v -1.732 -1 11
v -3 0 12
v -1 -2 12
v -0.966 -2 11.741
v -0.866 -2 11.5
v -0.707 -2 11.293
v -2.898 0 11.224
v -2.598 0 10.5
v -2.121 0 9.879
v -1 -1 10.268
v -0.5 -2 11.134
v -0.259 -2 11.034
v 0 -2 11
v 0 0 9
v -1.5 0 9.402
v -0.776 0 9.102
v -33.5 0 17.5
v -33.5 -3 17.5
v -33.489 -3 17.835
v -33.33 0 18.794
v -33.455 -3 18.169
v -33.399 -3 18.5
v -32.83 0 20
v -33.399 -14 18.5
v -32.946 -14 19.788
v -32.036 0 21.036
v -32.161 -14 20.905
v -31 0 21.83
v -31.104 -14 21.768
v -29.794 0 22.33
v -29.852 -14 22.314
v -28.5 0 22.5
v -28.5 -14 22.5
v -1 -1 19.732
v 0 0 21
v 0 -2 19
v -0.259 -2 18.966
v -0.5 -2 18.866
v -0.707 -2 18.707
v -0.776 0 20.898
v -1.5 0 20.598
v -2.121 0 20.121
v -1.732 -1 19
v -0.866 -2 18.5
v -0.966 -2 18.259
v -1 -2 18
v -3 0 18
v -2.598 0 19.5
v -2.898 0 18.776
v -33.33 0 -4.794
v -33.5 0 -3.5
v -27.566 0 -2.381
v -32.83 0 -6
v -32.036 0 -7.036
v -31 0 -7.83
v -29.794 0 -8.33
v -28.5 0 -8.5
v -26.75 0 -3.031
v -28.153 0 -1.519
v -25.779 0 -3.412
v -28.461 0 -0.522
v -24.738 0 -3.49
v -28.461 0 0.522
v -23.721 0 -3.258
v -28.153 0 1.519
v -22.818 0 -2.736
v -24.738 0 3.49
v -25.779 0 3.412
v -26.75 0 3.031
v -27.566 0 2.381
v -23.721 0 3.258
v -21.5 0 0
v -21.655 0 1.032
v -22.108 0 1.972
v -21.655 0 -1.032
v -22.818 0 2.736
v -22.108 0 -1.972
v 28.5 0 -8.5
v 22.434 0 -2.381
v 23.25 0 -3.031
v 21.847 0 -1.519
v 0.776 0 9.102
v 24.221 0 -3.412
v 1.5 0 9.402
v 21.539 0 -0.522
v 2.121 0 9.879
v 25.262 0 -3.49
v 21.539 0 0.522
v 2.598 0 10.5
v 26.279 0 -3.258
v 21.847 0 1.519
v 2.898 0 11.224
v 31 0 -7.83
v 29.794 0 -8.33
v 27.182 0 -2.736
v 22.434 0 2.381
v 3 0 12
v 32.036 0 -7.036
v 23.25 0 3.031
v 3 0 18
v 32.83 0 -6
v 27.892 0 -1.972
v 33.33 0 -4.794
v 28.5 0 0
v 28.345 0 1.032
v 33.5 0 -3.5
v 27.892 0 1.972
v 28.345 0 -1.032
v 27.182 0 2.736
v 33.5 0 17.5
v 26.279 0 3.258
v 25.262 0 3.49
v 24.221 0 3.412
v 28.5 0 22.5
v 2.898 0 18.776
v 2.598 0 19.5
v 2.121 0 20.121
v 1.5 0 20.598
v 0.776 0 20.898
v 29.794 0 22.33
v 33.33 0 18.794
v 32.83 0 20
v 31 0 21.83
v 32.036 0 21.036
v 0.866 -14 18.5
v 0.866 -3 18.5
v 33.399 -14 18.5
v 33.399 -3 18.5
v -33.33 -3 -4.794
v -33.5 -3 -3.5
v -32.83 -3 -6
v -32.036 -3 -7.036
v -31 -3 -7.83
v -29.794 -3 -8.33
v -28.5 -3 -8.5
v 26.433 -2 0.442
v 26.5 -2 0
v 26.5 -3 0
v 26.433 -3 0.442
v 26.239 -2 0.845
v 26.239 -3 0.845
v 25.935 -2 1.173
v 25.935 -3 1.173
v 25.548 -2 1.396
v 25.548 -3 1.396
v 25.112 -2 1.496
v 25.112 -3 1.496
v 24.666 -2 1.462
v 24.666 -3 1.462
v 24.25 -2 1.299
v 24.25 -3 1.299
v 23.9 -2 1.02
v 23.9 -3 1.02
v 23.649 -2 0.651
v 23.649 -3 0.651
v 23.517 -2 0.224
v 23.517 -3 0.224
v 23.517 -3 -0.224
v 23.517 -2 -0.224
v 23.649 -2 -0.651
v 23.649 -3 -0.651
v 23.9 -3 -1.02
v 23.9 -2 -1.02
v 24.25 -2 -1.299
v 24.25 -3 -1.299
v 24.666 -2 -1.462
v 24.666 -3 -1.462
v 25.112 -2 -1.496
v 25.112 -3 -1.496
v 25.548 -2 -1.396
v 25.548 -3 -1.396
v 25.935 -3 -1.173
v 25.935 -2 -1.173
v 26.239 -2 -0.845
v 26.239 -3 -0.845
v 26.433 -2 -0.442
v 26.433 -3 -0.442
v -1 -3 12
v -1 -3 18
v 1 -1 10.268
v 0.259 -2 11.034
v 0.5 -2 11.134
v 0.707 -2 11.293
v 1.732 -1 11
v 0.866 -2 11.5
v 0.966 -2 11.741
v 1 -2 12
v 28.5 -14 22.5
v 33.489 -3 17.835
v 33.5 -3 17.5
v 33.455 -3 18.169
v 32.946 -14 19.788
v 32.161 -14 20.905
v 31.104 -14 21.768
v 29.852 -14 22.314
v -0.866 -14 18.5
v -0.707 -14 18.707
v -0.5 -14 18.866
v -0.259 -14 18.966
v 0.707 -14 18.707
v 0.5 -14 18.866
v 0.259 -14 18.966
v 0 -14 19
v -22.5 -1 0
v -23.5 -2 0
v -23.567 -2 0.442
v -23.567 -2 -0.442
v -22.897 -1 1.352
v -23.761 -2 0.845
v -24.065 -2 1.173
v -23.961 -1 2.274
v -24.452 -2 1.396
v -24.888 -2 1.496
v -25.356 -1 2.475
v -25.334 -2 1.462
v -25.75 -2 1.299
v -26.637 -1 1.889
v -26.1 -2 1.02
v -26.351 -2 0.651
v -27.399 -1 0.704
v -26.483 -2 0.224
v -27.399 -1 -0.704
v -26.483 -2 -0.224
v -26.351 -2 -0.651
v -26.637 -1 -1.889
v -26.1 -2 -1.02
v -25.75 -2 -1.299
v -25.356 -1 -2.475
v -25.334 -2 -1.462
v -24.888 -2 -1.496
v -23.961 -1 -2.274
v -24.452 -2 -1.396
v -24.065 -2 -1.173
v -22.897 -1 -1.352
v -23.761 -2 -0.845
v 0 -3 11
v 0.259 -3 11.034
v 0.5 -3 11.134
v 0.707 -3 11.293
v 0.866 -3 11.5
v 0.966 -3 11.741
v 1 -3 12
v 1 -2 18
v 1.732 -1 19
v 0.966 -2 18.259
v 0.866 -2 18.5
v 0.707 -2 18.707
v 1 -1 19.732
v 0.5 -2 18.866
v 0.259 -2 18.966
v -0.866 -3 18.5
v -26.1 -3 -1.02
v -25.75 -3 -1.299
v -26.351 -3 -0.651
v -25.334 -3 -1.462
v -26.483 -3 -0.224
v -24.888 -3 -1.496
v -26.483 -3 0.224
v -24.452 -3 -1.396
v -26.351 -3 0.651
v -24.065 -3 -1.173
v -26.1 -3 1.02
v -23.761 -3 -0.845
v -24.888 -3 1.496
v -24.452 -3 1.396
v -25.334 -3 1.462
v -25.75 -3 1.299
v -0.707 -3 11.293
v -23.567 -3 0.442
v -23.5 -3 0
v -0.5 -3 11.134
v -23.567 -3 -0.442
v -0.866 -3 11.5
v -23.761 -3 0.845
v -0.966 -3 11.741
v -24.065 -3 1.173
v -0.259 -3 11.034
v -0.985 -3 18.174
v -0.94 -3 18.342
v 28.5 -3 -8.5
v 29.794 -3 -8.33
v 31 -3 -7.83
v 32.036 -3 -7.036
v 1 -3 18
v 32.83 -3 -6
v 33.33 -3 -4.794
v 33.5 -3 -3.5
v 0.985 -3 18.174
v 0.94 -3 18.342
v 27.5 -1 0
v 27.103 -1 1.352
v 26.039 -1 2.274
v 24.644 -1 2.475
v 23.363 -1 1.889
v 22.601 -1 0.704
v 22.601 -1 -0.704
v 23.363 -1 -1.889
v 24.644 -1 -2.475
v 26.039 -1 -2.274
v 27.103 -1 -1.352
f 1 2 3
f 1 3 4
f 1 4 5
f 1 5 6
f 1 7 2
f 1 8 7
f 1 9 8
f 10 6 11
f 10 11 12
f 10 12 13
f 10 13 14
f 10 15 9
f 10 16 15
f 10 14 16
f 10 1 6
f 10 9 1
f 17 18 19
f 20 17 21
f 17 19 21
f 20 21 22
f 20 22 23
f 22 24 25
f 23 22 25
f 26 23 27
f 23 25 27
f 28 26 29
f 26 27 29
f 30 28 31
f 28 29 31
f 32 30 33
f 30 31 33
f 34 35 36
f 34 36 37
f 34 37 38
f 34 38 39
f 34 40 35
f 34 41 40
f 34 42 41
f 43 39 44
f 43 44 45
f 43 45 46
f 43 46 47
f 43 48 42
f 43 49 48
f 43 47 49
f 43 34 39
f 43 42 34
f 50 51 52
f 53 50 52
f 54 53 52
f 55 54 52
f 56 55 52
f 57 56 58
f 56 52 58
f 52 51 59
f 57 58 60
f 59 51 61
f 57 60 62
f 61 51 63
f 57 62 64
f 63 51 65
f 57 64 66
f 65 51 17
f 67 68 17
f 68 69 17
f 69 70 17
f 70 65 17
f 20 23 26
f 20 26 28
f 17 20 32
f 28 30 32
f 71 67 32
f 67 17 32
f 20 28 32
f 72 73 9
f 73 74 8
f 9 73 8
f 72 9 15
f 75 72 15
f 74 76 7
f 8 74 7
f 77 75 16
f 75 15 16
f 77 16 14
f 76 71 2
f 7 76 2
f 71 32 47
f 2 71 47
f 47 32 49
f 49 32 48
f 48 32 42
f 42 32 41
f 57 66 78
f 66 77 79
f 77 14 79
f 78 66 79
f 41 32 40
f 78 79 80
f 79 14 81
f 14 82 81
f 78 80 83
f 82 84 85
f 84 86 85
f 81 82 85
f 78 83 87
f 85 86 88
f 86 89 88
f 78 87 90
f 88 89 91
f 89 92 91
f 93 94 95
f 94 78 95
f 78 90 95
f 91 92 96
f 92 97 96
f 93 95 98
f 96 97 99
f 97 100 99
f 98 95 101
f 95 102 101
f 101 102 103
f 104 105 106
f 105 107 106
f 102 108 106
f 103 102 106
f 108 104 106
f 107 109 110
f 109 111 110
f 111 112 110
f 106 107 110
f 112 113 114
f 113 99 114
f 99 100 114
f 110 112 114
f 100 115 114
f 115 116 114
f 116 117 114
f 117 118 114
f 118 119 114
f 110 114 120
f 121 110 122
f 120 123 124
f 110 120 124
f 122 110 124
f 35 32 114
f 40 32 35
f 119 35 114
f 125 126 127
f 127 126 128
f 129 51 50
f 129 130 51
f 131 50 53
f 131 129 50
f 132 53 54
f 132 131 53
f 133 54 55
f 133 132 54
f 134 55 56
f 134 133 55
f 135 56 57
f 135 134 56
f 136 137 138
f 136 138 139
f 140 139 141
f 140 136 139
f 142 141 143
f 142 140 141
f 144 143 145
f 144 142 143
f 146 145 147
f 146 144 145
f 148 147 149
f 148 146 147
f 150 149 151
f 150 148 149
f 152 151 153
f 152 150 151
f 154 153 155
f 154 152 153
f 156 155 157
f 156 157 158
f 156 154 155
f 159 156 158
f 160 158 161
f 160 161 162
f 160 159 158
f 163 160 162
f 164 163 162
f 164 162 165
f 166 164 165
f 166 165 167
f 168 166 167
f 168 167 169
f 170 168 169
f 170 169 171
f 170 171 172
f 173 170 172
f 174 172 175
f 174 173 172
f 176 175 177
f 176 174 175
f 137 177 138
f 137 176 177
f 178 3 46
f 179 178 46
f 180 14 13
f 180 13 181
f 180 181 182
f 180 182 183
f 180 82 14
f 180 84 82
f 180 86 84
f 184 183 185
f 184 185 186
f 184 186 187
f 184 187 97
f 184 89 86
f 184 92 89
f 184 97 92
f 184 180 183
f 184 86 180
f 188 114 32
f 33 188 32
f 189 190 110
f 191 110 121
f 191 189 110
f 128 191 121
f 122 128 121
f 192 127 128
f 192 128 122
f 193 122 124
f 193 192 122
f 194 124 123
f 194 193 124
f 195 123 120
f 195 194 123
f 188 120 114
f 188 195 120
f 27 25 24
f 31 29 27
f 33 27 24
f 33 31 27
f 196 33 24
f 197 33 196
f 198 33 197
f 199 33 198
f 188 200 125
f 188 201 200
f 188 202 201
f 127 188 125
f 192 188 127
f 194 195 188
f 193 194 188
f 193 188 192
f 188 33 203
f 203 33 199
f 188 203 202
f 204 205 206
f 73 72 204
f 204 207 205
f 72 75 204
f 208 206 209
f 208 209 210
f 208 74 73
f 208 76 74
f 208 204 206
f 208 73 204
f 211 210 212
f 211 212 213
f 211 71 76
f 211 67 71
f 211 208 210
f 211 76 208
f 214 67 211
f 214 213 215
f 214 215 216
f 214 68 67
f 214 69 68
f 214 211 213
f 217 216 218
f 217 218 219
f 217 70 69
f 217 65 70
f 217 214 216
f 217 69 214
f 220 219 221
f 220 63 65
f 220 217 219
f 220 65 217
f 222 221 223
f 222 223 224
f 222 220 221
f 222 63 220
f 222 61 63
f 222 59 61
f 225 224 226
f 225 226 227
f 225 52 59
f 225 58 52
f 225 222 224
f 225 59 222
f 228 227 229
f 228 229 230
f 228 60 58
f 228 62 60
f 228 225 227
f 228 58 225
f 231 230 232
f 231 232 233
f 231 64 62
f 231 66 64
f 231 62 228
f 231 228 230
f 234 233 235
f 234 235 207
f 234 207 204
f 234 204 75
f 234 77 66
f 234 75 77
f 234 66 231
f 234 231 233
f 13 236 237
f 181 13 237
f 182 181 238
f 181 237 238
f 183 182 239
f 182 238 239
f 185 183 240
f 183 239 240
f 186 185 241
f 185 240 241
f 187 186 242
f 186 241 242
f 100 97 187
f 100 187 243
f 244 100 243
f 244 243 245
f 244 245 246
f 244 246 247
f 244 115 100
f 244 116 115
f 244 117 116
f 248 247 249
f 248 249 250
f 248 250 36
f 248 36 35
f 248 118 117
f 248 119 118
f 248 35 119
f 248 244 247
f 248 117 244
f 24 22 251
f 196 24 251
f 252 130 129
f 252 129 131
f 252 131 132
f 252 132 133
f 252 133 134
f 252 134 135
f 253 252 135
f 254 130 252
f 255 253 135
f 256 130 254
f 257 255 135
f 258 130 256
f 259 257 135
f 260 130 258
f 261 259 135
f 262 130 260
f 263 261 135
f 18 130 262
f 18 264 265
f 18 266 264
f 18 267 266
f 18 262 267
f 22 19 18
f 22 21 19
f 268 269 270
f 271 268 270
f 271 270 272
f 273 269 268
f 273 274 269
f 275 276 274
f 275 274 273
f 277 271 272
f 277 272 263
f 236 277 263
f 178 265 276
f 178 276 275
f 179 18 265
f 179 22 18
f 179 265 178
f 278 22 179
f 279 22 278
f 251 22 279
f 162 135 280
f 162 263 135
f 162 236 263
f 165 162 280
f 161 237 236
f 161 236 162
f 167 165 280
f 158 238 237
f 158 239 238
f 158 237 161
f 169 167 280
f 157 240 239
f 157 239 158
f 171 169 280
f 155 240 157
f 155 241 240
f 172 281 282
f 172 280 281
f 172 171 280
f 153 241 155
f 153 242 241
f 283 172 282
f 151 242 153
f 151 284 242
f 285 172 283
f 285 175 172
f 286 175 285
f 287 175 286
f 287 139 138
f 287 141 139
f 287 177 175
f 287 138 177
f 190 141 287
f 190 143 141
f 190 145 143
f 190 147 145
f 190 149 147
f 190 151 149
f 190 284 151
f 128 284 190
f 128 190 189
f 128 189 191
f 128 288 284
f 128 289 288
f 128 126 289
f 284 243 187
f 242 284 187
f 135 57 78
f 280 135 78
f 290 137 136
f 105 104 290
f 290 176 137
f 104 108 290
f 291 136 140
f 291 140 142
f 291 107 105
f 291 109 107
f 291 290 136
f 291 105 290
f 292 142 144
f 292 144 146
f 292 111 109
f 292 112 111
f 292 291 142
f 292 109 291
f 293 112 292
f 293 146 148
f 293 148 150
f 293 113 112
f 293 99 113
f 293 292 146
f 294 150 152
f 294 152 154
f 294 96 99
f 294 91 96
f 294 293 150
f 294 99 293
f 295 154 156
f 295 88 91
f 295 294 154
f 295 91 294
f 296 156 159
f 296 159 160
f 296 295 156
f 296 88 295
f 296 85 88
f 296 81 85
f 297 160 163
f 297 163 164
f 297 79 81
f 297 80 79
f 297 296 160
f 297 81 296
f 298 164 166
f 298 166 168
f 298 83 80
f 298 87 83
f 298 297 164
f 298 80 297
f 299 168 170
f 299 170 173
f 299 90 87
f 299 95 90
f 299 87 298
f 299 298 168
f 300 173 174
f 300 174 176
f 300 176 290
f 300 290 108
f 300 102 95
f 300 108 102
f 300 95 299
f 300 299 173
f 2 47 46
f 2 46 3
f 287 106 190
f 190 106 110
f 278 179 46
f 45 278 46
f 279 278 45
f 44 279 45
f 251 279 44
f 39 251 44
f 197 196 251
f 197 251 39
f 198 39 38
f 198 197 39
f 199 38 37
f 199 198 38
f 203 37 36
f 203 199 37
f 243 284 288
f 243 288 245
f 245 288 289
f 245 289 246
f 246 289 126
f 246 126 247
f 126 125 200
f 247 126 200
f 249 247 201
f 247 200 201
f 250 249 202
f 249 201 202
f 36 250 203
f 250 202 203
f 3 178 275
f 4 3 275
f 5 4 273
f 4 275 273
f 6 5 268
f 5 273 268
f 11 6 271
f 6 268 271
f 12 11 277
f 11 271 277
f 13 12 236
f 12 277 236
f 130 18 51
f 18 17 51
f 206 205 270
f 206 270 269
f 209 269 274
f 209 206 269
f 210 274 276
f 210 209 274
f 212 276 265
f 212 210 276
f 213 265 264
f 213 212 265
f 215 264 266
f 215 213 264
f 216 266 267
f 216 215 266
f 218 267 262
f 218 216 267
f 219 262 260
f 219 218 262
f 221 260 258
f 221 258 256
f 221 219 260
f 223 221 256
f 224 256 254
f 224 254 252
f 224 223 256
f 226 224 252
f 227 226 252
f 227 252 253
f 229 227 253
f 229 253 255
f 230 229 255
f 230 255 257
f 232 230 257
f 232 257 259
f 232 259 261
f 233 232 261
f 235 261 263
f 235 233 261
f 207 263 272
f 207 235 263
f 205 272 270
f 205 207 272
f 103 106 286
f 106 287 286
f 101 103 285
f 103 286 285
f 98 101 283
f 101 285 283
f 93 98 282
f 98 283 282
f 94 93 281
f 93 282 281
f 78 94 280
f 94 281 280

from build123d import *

# Parameters (mm, degrees)
F0_W     = 67
F0_H     = 17
F0_R     = 1.5
F1_DEPTH = 3
F2_DEPTH = 14
F3_R     = 5
F4_R     = 0.99999
F5_SIZE  = 2


# Not quite as in the source:
# - a fillet or chamfer is up to 0.001 mm smaller than in the source, because OpenCascade refuses the exact size


with BuildPart() as f1:
    # F0 (on Front) → F1 (new body)
    with BuildSketch(Plane.XZ):
        Polygon((-33.5, 18.5), (-33.5, 8.5), (33.5, 8.5), (33.5, 18.5), (1, 18.5), (1, 11), (-1, 11), (-1, 18.5), align=None)
        Rectangle(F0_W, F0_H)
        with Locations((-25, 0)):
            Circle(F0_R, mode=Mode.SUBTRACT)
        with Locations((25, 0)):
            Circle(F0_R, mode=Mode.SUBTRACT)
    extrude(amount=F1_DEPTH)

    # F0 (on Front) → F2 (join)
    with BuildSketch(Plane.XZ):
        Polygon((-33.5, 22.5), (-33.5, 18.5), (-1, 18.5), (-1, 19), (1, 19), (1, 18.5), (33.5, 18.5), (33.5, 22.5), align=None)
    extrude(amount=F2_DEPTH)

    # F3
    f3_edges = [f1.edges().sort_by_distance(p)[0] for p in [
        (-33.5, -1.5, -8.5),
        (33.5, -1.5, -8.5),
        (-33.5, -7, 22.5),
        (33.5, -7, 22.5),
    ]]
    fillet(f3_edges, radius=F3_R)

    # F4 (radius 1 in the source; OpenCascade refuses exactly that, so slightly less here)
    f4_edges = [f1.edges().sort_by_distance(p)[0] for p in [
        (-1, -7, 19),
        (1, -7, 19),
        (1, -1.5, 11),
        (-1, -1.5, 11),
    ]]
    fillet(f4_edges, radius=F4_R)

    # F5
    f5_edges = [f1.edges().sort_by_distance(p)[0] for p in [
        (-26.5, 0, 0),
        (23.5, 0, 0),
        (-1, 0, 15),
    ]]
    chamfer(f5_edges, length=F5_SIZE)


solid = f1.part
